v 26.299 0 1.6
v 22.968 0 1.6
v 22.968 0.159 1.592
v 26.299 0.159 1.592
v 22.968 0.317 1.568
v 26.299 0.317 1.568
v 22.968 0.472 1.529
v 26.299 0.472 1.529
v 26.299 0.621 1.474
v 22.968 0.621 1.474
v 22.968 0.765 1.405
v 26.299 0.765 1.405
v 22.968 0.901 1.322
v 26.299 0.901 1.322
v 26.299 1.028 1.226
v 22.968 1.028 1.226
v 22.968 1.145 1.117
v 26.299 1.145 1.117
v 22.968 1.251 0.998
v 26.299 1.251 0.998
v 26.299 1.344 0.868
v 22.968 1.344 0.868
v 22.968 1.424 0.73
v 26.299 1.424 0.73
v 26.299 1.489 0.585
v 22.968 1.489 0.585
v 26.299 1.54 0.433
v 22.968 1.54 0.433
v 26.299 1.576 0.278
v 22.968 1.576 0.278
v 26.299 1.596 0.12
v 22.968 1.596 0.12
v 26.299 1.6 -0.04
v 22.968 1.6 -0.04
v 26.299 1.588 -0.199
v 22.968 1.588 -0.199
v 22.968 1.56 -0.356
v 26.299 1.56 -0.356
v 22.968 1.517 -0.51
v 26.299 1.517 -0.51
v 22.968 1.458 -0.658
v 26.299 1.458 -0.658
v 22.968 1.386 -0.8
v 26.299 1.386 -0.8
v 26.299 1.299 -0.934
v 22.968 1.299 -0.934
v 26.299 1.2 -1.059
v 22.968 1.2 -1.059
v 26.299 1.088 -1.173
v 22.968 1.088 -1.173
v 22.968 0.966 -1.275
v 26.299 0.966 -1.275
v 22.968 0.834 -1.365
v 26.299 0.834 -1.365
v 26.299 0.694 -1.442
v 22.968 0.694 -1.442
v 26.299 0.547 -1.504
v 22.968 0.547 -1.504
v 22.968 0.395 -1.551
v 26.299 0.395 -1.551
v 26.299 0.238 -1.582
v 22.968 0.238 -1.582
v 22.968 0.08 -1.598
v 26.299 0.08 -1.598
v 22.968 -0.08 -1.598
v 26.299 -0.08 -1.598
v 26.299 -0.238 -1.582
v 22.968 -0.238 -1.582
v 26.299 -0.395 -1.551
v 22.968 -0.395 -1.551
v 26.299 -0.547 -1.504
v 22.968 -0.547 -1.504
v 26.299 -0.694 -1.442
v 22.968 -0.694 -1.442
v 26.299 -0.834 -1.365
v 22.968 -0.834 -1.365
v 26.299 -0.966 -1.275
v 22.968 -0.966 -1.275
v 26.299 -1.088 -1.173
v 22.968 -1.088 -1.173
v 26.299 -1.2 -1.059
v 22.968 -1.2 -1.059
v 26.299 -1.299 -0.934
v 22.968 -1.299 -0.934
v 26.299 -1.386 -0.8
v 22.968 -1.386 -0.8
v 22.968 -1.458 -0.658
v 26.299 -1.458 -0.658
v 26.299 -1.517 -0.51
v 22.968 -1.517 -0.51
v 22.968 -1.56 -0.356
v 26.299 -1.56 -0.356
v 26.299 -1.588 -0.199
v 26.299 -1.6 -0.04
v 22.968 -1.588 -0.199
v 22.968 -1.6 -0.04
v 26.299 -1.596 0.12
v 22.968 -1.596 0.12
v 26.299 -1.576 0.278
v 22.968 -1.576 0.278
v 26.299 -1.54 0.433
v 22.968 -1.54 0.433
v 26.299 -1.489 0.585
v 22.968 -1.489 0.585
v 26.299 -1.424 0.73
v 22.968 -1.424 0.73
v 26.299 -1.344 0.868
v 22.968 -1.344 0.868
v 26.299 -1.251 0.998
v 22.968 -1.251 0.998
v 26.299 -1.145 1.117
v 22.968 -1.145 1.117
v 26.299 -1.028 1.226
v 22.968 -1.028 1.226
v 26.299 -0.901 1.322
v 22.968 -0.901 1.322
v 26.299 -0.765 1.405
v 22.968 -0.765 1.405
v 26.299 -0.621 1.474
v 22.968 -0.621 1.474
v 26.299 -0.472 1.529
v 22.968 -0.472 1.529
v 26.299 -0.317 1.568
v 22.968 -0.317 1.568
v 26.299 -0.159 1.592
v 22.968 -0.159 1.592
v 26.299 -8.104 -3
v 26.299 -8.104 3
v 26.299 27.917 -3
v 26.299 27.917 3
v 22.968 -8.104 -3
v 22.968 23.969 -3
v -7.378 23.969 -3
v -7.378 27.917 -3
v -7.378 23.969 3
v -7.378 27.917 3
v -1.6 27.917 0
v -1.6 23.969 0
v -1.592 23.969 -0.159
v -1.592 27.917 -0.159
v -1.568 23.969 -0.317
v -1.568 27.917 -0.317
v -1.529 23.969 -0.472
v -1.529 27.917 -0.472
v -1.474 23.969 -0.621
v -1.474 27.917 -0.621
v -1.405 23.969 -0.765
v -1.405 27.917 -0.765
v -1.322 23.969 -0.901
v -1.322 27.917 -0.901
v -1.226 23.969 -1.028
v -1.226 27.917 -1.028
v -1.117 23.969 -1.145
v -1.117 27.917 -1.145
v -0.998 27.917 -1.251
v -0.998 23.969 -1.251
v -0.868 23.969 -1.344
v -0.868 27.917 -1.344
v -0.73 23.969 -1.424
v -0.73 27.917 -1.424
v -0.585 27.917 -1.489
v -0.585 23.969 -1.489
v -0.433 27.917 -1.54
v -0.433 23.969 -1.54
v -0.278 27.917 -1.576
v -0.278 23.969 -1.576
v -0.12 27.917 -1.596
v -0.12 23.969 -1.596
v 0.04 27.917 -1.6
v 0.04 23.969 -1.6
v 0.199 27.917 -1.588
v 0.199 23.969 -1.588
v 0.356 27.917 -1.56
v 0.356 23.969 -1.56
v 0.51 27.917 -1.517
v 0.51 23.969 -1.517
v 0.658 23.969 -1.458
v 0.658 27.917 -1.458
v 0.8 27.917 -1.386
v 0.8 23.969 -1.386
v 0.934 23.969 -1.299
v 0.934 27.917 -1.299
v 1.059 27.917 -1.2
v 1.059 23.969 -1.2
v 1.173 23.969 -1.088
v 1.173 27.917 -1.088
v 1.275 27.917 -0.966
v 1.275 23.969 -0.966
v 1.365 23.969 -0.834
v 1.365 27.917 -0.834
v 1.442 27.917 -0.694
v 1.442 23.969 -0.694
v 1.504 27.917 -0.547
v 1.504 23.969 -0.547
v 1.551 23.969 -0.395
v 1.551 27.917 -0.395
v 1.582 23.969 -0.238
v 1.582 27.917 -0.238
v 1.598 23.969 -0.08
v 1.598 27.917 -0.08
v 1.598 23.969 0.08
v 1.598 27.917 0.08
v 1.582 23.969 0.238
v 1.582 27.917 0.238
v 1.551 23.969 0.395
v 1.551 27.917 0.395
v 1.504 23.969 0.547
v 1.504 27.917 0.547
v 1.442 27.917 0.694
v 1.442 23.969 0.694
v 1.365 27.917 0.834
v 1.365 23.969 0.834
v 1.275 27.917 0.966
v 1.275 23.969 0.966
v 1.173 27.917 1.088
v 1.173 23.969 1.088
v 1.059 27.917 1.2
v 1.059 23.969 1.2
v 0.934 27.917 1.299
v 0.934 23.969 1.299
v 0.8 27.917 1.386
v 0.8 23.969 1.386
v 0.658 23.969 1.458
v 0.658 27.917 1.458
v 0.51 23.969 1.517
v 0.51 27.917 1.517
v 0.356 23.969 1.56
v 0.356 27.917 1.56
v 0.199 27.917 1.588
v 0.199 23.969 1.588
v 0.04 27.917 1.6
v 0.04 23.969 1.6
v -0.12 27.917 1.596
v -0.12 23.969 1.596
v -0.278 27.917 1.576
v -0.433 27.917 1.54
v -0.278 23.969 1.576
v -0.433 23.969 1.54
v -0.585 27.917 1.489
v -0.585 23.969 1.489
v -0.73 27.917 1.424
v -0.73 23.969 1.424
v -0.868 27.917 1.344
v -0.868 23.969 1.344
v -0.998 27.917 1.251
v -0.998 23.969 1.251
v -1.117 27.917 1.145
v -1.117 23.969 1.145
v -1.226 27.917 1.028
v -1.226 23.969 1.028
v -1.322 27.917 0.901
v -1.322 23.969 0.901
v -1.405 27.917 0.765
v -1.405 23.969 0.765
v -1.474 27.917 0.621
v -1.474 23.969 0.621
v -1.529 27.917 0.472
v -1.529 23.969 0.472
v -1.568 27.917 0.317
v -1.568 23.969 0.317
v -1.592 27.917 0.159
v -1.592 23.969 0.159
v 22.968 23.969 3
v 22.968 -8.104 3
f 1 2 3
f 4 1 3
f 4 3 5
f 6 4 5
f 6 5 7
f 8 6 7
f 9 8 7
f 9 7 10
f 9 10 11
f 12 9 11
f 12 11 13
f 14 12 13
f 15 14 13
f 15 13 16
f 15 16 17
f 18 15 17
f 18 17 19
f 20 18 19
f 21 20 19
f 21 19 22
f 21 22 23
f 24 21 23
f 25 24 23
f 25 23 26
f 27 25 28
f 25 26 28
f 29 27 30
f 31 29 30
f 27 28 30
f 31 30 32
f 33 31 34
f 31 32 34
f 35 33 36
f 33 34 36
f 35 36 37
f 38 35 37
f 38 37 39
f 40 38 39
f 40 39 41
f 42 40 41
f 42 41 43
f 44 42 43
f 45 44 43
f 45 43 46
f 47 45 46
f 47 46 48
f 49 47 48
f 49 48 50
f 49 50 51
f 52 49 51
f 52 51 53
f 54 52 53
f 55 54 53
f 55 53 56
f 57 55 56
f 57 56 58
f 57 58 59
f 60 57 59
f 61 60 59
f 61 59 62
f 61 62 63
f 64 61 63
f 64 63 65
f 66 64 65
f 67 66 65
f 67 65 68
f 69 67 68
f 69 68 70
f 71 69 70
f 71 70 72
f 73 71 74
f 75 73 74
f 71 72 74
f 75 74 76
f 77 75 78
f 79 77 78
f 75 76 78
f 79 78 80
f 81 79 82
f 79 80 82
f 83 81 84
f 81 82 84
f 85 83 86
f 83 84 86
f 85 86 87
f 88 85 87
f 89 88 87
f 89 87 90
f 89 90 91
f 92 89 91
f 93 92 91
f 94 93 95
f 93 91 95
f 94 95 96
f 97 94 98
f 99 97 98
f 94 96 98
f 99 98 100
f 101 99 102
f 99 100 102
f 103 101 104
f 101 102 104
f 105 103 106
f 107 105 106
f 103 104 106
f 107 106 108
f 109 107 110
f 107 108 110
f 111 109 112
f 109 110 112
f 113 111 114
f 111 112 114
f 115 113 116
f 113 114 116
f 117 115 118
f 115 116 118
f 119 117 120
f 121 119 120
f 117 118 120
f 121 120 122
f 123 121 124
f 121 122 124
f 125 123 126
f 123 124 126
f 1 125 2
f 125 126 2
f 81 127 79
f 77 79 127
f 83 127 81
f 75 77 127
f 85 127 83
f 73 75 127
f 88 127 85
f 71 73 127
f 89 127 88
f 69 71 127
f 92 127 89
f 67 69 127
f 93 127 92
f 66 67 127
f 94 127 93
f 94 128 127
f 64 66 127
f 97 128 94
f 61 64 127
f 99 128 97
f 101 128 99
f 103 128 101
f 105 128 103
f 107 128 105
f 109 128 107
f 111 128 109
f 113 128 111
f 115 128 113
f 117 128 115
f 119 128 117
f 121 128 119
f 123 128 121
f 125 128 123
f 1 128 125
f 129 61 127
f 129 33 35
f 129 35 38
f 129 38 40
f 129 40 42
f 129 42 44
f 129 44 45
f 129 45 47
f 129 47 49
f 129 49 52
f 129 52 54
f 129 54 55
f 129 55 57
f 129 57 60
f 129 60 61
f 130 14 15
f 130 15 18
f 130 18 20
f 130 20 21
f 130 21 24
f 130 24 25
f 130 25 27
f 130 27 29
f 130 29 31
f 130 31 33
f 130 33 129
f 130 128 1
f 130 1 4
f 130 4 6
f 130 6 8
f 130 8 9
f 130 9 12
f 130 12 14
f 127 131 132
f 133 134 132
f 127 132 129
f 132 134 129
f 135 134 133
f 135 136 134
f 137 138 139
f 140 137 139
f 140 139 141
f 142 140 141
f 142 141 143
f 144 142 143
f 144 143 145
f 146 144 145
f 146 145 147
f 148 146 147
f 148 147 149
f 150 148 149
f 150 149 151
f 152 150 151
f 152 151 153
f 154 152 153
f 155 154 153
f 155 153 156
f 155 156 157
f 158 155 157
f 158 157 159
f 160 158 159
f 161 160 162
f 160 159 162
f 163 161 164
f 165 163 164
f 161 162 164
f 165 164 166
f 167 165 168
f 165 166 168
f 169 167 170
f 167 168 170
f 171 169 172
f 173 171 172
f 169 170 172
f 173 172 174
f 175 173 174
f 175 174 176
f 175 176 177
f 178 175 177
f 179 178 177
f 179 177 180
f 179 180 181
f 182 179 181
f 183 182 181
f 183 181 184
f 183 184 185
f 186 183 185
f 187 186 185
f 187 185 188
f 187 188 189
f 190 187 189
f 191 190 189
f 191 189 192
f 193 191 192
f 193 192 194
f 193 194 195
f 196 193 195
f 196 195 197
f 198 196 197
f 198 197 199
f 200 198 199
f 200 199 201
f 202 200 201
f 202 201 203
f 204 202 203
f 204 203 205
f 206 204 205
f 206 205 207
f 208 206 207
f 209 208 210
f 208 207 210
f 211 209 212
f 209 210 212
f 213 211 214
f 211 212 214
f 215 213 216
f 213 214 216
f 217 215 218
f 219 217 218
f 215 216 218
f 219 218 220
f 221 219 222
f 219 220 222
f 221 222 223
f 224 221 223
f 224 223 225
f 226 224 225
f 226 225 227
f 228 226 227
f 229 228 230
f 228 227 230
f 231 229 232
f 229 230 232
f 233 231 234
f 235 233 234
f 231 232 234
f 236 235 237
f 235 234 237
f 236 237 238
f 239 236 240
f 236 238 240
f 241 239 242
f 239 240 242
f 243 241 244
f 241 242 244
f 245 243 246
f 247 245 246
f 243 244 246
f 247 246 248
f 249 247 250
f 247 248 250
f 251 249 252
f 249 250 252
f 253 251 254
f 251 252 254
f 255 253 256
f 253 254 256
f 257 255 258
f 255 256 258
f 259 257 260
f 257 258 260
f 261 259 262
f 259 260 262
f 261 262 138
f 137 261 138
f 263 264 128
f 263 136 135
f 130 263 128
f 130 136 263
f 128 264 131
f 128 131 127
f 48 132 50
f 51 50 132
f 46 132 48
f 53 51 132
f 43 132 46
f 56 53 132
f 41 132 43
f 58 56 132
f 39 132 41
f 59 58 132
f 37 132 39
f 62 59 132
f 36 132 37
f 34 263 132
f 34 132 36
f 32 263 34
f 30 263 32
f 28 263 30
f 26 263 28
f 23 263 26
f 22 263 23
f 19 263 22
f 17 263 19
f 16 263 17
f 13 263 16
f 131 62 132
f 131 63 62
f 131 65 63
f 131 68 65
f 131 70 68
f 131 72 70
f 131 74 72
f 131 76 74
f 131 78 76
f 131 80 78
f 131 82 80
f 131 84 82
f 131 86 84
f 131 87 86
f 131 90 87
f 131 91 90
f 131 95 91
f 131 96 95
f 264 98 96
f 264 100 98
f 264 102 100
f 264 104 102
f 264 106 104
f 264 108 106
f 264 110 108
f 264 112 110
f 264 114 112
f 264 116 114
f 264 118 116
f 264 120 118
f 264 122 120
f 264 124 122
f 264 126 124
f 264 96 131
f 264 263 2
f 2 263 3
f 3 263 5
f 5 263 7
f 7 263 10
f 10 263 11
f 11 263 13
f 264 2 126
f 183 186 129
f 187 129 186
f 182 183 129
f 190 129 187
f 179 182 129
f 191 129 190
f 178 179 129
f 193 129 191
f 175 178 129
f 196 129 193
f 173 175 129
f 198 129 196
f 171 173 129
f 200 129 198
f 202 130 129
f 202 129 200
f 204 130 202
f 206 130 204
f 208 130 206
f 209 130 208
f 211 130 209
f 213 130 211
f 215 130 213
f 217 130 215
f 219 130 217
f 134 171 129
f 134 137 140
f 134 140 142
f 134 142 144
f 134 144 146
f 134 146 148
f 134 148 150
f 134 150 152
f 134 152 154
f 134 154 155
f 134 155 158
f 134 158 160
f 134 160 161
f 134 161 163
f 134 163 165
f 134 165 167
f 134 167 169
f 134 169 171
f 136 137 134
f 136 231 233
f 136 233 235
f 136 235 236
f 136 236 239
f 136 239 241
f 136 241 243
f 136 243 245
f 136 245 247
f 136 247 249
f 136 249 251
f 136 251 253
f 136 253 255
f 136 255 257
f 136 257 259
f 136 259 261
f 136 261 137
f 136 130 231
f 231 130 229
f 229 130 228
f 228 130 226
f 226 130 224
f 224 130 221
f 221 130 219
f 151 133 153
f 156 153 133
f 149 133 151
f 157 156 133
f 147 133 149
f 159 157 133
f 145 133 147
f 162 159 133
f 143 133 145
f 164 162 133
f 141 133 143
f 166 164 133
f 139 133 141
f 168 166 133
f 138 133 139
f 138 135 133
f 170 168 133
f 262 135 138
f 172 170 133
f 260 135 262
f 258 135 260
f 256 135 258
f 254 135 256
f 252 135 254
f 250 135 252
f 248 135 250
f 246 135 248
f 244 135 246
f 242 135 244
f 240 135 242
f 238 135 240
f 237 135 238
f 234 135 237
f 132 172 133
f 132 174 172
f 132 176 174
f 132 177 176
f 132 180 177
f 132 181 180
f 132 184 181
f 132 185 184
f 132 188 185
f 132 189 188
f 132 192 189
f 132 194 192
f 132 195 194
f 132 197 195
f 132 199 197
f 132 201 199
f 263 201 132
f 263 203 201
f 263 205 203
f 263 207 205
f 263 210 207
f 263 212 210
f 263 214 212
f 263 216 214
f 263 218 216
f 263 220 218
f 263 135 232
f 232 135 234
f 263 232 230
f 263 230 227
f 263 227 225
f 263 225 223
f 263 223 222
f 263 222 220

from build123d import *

# Parameters (mm, degrees)
BOSS_EXTRUDE1_DEPTH      = 3
BOSS_EXTRUDE1_DEPTH_BACK = 3
M3_CLEARANCE_HOLE1_D     = 3.2
M3_CLEARANCE_HOLE1_DEPTH = 3.947545897
M3_CLEARANCE_HOLE2_D     = 3.2
M3_CLEARANCE_HOLE2_DEPTH = 3.330741851


with BuildPart() as part:
    # Sketch1 → Boss-Extrude1 (new body, two sides)
    with BuildSketch(Plane.XY) as boss_extrude1_sk:
        Polygon((-7.378385455, 23.969381317), (22.968373629, 23.969381317), (22.968373629, -8.104429097), (26.29911548, -8.104429097), (26.29911548, 27.916927214), (-7.378385455, 27.916927214), align=None)
    extrude(amount=BOSS_EXTRUDE1_DEPTH)
    extrude(boss_extrude1_sk.sketch, amount=-BOSS_EXTRUDE1_DEPTH_BACK)

    # M3 Clearance Hole1
    with Locations(Plane(origin=(0, 27.916927214, 0), x_dir=(1, 0, 0), z_dir=(0, 1, 0))):
        with Locations((0, 0)):
            Hole(M3_CLEARANCE_HOLE1_D / 2, depth=M3_CLEARANCE_HOLE1_DEPTH)

    # M3 Clearance Hole2
    with Locations(Plane(origin=(26.29911548, 0, 0), x_dir=(0, 0, -1), z_dir=(1, 0, 0))):
        with Locations((0, 0)):
            Hole(M3_CLEARANCE_HOLE2_D / 2, depth=M3_CLEARANCE_HOLE2_DEPTH)


solid = part.part
